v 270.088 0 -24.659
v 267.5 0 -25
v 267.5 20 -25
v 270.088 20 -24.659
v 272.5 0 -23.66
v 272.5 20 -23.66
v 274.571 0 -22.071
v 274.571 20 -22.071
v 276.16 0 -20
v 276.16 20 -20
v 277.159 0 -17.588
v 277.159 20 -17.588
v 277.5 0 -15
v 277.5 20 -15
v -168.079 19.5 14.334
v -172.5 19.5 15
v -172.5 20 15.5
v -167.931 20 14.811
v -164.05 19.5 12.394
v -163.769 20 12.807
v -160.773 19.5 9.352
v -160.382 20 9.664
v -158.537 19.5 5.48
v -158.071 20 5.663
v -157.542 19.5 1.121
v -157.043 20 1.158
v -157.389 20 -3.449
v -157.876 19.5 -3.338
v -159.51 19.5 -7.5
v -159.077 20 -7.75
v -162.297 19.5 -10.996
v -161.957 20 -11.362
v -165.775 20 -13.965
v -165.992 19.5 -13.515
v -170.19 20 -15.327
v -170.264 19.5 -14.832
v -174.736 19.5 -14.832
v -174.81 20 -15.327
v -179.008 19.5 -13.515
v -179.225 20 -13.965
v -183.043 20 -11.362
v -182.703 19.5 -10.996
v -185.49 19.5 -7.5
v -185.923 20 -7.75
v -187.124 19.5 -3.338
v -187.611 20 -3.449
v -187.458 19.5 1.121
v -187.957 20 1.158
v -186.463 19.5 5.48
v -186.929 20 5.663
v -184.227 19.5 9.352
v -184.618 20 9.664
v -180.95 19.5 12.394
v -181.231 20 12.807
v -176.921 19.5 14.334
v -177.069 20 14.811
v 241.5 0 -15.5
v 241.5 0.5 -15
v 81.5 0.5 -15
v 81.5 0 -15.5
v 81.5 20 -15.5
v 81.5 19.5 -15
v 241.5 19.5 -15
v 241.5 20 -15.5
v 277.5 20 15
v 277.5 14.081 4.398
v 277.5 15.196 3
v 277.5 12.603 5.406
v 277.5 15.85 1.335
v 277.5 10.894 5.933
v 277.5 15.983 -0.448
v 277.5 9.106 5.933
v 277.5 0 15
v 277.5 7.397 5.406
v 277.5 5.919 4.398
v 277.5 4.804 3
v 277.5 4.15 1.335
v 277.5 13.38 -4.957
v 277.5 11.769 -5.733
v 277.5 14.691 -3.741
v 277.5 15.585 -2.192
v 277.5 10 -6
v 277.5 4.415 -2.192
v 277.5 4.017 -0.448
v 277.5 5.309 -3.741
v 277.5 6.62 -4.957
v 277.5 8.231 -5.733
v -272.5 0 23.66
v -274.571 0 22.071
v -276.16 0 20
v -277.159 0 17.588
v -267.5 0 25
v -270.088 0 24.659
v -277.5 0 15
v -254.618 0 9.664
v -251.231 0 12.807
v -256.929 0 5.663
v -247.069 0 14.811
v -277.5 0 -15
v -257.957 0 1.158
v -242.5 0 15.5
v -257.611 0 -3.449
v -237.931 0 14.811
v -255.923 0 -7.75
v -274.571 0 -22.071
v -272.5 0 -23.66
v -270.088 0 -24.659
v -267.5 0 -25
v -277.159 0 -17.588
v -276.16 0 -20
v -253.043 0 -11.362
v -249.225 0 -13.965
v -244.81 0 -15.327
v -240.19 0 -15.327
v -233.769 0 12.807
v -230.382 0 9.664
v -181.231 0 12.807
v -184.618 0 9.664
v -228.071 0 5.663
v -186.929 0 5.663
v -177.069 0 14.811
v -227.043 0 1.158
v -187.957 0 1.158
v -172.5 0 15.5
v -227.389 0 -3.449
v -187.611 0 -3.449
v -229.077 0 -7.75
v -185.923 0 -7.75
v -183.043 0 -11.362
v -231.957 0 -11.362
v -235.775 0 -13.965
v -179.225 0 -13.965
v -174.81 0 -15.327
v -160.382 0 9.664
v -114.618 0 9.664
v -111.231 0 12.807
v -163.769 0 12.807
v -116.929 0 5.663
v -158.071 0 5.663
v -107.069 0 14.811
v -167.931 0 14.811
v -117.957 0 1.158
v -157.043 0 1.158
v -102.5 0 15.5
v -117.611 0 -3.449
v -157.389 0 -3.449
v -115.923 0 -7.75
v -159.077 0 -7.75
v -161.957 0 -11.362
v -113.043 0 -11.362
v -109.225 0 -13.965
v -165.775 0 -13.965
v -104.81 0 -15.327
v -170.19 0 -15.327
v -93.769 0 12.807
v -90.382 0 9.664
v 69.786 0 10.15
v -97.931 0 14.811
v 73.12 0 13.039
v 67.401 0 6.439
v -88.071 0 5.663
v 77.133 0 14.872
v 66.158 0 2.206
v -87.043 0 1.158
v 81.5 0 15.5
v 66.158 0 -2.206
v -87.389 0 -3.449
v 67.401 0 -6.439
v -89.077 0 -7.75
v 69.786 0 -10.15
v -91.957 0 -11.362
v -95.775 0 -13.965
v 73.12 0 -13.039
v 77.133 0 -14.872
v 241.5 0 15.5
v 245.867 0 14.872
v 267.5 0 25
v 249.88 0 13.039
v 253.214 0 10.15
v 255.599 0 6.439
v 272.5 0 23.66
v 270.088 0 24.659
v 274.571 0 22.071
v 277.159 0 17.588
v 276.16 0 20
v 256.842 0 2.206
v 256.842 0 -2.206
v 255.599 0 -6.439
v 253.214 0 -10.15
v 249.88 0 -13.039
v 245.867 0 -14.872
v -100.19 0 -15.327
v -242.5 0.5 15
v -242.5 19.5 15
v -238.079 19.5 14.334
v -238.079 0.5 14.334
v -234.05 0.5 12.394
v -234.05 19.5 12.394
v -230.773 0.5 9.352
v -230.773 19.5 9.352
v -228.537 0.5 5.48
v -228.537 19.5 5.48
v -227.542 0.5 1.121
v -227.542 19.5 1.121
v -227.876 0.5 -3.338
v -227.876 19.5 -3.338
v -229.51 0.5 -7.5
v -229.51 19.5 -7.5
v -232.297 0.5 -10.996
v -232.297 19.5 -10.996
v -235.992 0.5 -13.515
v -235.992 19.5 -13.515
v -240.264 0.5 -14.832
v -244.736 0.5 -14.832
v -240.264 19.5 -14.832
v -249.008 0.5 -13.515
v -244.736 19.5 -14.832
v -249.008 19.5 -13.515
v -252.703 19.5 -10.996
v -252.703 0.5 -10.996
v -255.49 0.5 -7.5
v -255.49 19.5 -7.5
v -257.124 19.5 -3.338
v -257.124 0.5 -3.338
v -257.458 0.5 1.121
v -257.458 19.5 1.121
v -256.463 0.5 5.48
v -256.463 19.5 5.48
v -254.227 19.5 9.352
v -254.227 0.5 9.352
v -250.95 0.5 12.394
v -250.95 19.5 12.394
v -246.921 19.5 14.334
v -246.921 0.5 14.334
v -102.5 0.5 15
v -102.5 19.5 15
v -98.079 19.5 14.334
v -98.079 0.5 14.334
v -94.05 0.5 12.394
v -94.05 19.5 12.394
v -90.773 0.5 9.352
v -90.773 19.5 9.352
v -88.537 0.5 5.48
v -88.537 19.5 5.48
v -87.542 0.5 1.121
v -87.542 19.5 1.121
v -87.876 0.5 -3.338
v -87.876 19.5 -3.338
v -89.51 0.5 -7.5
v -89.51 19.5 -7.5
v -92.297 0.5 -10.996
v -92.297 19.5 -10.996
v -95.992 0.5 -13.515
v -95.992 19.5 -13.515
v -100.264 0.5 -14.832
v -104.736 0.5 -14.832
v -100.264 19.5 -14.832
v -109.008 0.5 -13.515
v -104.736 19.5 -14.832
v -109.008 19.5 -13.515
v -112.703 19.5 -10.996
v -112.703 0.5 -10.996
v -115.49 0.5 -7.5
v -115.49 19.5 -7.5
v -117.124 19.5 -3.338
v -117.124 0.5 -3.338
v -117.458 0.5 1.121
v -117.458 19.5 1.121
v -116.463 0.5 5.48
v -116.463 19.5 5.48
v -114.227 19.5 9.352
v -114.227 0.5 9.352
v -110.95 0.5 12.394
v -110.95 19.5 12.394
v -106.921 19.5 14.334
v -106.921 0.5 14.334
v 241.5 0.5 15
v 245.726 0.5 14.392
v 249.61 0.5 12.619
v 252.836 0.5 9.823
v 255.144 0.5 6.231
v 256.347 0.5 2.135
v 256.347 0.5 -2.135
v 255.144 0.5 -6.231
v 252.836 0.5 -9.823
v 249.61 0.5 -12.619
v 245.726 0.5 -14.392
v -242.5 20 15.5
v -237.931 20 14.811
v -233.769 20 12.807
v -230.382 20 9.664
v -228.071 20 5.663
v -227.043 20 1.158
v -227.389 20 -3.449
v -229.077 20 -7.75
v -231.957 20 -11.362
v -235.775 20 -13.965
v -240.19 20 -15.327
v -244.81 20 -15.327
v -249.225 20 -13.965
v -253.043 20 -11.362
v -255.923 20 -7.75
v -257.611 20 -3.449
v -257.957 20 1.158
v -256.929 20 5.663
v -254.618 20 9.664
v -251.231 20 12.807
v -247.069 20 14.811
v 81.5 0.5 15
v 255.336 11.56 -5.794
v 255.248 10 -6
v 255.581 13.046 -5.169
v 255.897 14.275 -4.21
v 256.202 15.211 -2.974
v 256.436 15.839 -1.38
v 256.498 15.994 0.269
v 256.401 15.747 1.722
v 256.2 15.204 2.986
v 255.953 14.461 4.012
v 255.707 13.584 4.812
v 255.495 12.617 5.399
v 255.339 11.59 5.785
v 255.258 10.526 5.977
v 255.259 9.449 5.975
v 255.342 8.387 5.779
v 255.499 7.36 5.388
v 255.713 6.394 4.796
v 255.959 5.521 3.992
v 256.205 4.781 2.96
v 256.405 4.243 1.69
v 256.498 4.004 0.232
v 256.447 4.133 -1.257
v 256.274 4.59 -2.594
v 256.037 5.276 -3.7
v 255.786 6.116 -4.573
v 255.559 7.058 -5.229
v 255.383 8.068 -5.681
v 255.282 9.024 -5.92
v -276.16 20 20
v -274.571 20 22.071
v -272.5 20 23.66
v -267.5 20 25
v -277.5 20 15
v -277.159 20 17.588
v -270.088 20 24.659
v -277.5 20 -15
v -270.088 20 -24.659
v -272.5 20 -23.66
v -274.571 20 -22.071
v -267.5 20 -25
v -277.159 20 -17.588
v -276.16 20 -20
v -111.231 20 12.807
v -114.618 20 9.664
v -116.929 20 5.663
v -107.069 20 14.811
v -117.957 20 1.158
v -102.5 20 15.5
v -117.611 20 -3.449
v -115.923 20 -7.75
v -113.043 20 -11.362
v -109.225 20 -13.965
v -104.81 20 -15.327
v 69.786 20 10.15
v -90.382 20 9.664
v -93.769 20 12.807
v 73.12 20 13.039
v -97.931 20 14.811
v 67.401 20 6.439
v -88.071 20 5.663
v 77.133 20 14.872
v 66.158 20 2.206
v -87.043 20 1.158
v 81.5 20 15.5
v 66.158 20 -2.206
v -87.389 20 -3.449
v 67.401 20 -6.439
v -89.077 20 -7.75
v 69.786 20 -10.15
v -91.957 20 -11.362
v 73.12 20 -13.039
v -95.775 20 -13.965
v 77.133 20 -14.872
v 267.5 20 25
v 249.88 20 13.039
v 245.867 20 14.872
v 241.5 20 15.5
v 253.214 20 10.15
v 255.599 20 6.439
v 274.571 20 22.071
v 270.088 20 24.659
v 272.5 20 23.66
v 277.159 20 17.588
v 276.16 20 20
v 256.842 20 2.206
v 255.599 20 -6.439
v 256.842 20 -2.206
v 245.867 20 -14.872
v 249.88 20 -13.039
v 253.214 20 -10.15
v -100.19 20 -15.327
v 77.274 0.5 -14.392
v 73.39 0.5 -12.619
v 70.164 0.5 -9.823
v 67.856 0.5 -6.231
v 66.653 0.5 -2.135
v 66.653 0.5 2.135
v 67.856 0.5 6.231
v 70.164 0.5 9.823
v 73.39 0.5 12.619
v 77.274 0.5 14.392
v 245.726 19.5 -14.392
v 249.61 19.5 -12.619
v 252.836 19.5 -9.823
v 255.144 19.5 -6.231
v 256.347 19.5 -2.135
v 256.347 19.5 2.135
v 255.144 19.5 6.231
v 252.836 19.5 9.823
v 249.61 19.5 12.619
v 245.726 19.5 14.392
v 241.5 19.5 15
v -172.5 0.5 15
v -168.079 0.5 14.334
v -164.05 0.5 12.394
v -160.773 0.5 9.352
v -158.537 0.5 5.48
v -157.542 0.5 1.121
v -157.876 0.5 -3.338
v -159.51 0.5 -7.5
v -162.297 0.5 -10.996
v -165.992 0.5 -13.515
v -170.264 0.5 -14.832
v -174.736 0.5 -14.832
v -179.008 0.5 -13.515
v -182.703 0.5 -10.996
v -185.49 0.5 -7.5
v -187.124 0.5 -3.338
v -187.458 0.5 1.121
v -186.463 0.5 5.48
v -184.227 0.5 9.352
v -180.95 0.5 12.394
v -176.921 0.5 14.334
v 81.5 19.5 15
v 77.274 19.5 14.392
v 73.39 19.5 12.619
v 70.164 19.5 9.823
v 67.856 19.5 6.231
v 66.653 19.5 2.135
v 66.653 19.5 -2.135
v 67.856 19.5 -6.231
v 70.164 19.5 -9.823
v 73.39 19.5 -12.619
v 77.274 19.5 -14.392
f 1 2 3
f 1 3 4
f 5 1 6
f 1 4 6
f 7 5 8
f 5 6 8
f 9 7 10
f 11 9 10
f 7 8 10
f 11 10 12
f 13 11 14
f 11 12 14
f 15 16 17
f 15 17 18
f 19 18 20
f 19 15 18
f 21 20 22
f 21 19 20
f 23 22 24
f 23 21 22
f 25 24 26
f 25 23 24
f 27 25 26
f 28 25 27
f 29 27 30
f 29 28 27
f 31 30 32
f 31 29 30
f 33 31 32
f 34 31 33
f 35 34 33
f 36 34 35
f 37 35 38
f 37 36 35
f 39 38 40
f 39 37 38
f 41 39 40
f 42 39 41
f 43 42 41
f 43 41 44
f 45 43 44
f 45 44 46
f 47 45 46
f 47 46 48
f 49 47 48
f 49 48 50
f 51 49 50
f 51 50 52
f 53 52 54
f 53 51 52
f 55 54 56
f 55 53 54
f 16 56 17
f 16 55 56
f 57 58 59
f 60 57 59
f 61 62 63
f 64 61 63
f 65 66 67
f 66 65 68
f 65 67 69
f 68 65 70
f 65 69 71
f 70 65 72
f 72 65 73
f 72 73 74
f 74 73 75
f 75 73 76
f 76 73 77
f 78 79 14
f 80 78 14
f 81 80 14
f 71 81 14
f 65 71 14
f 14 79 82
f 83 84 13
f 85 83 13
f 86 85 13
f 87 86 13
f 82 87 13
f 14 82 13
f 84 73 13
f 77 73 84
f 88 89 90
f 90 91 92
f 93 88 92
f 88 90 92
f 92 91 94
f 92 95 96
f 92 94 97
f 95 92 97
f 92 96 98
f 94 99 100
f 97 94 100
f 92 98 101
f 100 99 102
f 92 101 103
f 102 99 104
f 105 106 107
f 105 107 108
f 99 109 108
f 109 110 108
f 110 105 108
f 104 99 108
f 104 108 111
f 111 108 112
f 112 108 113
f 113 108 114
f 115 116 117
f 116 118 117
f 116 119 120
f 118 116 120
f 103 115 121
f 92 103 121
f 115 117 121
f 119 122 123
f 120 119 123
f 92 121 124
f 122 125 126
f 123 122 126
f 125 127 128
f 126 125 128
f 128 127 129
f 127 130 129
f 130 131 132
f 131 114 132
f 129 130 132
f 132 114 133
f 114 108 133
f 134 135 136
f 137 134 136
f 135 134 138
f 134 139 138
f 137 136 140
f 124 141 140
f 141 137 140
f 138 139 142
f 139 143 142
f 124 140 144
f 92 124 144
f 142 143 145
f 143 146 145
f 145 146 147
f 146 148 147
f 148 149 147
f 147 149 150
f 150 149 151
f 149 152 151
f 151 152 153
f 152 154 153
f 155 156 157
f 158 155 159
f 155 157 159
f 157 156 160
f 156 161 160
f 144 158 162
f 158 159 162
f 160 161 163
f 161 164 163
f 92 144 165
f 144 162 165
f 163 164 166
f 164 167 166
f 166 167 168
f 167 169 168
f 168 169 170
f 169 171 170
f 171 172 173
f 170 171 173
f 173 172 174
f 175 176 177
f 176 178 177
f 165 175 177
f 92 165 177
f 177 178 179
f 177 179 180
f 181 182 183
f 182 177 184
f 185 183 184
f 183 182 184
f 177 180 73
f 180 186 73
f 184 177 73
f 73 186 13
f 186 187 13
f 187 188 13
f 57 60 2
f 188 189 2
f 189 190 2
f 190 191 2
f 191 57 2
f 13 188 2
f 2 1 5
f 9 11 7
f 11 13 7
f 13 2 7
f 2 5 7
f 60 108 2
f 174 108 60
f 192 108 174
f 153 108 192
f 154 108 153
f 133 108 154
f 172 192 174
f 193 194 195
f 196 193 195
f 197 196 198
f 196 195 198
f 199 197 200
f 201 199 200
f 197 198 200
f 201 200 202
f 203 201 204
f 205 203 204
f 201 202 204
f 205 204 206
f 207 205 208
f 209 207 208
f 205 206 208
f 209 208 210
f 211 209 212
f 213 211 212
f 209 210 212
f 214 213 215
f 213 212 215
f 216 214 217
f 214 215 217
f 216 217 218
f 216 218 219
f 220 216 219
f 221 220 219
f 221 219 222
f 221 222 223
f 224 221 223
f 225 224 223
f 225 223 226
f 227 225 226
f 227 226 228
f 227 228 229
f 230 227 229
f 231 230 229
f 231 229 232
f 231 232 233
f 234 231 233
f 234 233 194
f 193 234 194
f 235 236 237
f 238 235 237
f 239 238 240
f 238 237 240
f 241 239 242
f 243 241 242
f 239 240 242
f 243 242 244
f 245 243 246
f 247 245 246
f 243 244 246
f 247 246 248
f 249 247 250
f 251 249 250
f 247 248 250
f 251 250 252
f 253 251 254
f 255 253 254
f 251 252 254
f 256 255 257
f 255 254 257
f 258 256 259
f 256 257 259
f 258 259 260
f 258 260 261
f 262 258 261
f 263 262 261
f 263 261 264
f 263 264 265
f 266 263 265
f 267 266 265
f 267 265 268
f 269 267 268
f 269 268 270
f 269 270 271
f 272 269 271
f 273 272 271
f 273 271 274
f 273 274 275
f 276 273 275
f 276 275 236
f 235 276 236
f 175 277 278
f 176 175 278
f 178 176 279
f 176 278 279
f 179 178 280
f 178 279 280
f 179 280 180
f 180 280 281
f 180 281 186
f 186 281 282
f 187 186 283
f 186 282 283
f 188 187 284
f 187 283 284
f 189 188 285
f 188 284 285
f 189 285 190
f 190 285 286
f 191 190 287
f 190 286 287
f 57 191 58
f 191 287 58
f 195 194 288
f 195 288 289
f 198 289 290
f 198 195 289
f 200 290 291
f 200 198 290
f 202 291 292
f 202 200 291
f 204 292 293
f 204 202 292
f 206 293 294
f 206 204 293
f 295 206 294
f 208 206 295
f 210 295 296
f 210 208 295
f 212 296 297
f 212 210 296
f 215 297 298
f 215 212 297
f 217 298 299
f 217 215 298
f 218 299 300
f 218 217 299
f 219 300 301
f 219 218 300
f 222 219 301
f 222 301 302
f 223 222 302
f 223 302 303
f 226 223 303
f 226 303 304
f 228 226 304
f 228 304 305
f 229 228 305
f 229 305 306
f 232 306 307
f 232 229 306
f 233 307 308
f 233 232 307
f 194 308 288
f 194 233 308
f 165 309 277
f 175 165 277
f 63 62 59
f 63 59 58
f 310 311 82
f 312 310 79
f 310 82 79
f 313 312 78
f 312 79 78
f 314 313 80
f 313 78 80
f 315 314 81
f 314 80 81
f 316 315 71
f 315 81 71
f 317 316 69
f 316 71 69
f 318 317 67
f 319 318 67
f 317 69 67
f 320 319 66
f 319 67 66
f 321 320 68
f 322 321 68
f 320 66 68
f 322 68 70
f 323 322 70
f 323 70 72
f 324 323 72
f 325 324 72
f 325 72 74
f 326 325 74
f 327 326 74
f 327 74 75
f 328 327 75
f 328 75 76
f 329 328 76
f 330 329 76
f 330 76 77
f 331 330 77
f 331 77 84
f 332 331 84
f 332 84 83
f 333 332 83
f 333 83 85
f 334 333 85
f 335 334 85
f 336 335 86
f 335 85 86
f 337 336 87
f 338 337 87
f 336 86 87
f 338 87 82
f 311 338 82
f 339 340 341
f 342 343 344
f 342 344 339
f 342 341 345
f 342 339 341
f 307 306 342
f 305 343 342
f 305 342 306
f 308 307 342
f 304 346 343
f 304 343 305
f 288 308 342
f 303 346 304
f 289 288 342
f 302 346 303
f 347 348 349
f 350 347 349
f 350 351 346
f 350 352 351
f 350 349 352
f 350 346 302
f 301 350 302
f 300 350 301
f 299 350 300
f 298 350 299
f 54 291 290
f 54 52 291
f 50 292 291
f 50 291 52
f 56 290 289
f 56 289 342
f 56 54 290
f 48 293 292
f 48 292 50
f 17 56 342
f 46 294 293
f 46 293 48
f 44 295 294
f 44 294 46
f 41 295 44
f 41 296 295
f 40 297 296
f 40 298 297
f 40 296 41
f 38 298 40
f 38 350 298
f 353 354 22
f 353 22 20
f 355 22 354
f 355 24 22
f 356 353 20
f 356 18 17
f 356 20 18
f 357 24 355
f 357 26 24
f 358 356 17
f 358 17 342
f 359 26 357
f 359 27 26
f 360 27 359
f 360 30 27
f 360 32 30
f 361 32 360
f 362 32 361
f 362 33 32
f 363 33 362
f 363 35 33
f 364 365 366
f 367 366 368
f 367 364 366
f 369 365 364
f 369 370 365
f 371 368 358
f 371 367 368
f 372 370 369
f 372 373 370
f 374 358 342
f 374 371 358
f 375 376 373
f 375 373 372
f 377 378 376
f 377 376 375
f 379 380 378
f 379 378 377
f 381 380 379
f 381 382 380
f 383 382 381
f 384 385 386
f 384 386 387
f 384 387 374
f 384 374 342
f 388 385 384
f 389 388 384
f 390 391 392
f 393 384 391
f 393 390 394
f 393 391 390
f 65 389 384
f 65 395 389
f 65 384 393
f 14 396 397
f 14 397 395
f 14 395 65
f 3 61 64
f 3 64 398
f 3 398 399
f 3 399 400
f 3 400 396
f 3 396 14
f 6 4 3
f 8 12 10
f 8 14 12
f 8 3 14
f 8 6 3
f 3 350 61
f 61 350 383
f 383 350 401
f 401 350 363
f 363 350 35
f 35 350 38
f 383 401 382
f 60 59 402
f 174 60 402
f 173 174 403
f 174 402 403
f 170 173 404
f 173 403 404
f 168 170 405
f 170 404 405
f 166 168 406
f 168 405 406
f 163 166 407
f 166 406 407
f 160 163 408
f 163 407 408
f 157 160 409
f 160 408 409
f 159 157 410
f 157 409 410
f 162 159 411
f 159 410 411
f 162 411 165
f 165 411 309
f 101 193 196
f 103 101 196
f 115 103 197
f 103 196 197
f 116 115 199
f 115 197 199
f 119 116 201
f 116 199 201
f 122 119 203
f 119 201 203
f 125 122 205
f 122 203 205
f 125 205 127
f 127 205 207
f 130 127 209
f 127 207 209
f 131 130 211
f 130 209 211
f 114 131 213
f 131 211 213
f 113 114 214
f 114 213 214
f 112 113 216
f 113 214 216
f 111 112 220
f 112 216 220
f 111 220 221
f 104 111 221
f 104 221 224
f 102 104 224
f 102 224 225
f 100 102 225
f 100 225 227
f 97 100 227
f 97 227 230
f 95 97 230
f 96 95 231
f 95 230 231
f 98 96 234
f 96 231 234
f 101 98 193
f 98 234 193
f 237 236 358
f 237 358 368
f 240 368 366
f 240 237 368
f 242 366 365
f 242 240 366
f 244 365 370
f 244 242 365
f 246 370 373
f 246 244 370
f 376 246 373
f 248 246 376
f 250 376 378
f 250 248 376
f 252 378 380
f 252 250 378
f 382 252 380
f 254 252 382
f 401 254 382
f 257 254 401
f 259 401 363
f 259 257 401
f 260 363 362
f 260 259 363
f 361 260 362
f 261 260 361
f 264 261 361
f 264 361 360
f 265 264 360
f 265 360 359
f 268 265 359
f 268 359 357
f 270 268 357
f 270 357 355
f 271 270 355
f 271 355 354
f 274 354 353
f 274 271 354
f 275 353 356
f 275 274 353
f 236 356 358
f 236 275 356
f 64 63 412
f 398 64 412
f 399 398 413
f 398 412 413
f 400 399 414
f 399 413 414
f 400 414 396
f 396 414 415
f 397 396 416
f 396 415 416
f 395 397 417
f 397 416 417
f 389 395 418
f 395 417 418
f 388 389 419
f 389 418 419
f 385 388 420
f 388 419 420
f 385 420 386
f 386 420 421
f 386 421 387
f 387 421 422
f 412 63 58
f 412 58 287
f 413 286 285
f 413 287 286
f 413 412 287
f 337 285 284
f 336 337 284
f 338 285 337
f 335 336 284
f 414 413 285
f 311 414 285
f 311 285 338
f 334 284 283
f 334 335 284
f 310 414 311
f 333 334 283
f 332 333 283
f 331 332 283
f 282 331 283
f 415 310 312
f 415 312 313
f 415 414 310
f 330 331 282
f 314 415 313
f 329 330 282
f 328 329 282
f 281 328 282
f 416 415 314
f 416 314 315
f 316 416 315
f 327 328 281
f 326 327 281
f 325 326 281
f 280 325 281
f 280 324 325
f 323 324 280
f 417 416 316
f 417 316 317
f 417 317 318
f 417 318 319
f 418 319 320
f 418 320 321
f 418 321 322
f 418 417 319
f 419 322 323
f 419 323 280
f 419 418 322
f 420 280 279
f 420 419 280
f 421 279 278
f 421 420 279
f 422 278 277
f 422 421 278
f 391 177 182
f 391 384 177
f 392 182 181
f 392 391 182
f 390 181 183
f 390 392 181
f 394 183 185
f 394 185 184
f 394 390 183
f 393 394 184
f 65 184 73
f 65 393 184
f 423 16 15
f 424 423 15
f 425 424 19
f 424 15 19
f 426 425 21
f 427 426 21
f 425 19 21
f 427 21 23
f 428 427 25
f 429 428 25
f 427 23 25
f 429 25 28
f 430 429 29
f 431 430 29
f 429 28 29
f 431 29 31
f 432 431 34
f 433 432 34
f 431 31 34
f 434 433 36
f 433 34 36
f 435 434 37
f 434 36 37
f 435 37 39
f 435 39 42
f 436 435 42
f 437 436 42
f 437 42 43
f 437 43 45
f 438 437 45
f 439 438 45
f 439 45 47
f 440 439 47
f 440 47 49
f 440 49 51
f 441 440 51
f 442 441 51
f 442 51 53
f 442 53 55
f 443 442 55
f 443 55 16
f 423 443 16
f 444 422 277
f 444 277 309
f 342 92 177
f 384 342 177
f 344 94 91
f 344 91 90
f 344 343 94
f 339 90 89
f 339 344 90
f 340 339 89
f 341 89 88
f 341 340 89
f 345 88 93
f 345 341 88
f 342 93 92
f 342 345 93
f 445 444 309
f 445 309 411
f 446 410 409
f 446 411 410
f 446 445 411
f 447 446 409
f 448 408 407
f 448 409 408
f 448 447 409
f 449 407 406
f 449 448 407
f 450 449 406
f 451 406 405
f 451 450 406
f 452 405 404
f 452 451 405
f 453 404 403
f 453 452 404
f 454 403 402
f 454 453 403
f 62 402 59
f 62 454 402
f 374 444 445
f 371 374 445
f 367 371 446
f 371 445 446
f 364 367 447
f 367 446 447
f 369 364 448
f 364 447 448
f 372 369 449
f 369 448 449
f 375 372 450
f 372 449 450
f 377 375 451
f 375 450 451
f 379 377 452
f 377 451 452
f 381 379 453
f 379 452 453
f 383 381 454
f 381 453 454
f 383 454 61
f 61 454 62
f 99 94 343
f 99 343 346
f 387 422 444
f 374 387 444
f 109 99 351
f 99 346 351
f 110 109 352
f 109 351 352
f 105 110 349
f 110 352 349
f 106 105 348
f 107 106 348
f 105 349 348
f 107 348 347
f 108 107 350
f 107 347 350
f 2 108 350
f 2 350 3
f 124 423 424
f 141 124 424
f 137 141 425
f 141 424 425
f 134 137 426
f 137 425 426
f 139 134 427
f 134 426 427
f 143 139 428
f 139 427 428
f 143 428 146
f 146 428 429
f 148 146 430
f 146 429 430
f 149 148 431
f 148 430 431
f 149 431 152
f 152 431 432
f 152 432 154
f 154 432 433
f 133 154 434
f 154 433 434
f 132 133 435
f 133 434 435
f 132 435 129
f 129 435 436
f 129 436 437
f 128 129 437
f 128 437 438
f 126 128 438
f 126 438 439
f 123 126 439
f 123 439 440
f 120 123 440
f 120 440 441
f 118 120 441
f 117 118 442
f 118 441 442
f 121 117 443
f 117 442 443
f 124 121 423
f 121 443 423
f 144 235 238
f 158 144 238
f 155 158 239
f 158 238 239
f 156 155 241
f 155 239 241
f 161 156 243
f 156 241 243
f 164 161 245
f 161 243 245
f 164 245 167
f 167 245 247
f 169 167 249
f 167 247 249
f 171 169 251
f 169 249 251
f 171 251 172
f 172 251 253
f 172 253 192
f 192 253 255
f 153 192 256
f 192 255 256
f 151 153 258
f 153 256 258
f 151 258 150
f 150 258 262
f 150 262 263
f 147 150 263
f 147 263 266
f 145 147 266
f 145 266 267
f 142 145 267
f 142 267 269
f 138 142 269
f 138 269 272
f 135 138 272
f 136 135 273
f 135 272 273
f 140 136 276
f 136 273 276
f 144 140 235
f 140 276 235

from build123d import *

# Parameters (mm, degrees)
SKETCH_1_W               = 555
SKETCH_1_H               = 50
EXTRUDE_1_DEPTH          = 20
SKETCH_2_R               = 15
CUT_EXTRUDE_1_DEPTH      = 280.340741747
CUT_EXTRUDE_2_REACH      = 557.923
CUT_EXTRUDE_2_END_RADIUS = 15
SKETCH_3_R               = 6
FILLET_1_R               = 10
CHAMFER_1_SIZE           = 0.5


with BuildPart() as part:
    # 草图1 → 凸台-拉伸1 (new body)
    with BuildSketch(Plane(origin=(0, 0, 0), x_dir=(1, 0, 0), z_dir=(0, 1, 0))):
        Rectangle(SKETCH_1_W, SKETCH_1_H)
    extrude(amount=EXTRUDE_1_DEPTH)

    # 草图2 → 切除-拉伸1 (cut, through all)
    with BuildSketch(Plane(origin=(0, 20, 0), x_dir=(1, 0, 0), z_dir=(0, 1, 0))):
        with Locations(Location((-242.5, 0, 0), (0, 0, 270))):
            Circle(SKETCH_2_R)
        with Locations(Location((-172.5, 0, 0), (0, 0, 270))):
            Circle(SKETCH_2_R)
        with Locations(Location((-102.5, 0, 0), (0, 0, 270))):
            Circle(SKETCH_2_R)
        with BuildLine():
            Line((81.5, 15), (241.5, 15))
            ThreePointArc((241.5, 15), (256.5, 0), (241.5, -15))
            Line((241.5, -15), (81.5, -15))
            ThreePointArc((81.5, -15), (66.5, 0), (81.5, 15))
        make_face()
    extrude(amount=-CUT_EXTRUDE_1_DEPTH, mode=Mode.SUBTRACT)

    # 切除-拉伸2: up to this cylinder (the profile starts outside it)
    cut_extrude_2_end = Plane(origin=(241.5, 10, 0), z_dir=(0, 1, 0)) * Cylinder(CUT_EXTRUDE_2_END_RADIUS, 1146.846, mode=Mode.PRIVATE)
    # 草图3 → 切除-拉伸2 (cut, up to the surface)
    with BuildSketch(Plane(origin=(277.5, 0, 0), x_dir=(0, 0, -1), z_dir=(1, 0, 0)), mode=Mode.PRIVATE) as cut_extrude_2_sk1:
        with Locations((0, 10)):
            Circle(SKETCH_3_R)
    cut_extrude_2_tool1 = extrude(cut_extrude_2_sk1.sketch, amount=-CUT_EXTRUDE_2_REACH, mode=Mode.PRIVATE) - cut_extrude_2_end
    add(cut_extrude_2_tool1.solids().sort_by_distance((277.5, 10, 0))[0], mode=Mode.SUBTRACT)

    # 圆角1
    fillet_1_edges = [part.edges().sort_by_distance(p)[0] for p in [
        (-277.5, 10, -25),
        (277.5, 10, -25),
        (277.5, 10, 25),
        (-277.5, 10, 25),
    ]]
    fillet(fillet_1_edges, radius=FILLET_1_R)

    # 倒角1
    chamfer_1_edges = [part.edges().sort_by_distance(p)[0] for p in [
        (-242.5, 0, -15),
        (-242.5, 20, -15),
        (-172.5, 0, -15),
        (-172.5, 20, -15),
        (-102.5, 0, -15),
        (-102.5, 20, -15),
        (66.5, 0, 0),
        (161.5, 0, -15),
        (256.5, 0, 0),
        (161.5, 0, 15),
        (66.5, 20, 0),
        (161.5, 20, 15),
        (256.5, 20, 0),
        (161.5, 20, -15),
    ]]
    chamfer(chamfer_1_edges, length=CHAMFER_1_SIZE)


solid = part.part
